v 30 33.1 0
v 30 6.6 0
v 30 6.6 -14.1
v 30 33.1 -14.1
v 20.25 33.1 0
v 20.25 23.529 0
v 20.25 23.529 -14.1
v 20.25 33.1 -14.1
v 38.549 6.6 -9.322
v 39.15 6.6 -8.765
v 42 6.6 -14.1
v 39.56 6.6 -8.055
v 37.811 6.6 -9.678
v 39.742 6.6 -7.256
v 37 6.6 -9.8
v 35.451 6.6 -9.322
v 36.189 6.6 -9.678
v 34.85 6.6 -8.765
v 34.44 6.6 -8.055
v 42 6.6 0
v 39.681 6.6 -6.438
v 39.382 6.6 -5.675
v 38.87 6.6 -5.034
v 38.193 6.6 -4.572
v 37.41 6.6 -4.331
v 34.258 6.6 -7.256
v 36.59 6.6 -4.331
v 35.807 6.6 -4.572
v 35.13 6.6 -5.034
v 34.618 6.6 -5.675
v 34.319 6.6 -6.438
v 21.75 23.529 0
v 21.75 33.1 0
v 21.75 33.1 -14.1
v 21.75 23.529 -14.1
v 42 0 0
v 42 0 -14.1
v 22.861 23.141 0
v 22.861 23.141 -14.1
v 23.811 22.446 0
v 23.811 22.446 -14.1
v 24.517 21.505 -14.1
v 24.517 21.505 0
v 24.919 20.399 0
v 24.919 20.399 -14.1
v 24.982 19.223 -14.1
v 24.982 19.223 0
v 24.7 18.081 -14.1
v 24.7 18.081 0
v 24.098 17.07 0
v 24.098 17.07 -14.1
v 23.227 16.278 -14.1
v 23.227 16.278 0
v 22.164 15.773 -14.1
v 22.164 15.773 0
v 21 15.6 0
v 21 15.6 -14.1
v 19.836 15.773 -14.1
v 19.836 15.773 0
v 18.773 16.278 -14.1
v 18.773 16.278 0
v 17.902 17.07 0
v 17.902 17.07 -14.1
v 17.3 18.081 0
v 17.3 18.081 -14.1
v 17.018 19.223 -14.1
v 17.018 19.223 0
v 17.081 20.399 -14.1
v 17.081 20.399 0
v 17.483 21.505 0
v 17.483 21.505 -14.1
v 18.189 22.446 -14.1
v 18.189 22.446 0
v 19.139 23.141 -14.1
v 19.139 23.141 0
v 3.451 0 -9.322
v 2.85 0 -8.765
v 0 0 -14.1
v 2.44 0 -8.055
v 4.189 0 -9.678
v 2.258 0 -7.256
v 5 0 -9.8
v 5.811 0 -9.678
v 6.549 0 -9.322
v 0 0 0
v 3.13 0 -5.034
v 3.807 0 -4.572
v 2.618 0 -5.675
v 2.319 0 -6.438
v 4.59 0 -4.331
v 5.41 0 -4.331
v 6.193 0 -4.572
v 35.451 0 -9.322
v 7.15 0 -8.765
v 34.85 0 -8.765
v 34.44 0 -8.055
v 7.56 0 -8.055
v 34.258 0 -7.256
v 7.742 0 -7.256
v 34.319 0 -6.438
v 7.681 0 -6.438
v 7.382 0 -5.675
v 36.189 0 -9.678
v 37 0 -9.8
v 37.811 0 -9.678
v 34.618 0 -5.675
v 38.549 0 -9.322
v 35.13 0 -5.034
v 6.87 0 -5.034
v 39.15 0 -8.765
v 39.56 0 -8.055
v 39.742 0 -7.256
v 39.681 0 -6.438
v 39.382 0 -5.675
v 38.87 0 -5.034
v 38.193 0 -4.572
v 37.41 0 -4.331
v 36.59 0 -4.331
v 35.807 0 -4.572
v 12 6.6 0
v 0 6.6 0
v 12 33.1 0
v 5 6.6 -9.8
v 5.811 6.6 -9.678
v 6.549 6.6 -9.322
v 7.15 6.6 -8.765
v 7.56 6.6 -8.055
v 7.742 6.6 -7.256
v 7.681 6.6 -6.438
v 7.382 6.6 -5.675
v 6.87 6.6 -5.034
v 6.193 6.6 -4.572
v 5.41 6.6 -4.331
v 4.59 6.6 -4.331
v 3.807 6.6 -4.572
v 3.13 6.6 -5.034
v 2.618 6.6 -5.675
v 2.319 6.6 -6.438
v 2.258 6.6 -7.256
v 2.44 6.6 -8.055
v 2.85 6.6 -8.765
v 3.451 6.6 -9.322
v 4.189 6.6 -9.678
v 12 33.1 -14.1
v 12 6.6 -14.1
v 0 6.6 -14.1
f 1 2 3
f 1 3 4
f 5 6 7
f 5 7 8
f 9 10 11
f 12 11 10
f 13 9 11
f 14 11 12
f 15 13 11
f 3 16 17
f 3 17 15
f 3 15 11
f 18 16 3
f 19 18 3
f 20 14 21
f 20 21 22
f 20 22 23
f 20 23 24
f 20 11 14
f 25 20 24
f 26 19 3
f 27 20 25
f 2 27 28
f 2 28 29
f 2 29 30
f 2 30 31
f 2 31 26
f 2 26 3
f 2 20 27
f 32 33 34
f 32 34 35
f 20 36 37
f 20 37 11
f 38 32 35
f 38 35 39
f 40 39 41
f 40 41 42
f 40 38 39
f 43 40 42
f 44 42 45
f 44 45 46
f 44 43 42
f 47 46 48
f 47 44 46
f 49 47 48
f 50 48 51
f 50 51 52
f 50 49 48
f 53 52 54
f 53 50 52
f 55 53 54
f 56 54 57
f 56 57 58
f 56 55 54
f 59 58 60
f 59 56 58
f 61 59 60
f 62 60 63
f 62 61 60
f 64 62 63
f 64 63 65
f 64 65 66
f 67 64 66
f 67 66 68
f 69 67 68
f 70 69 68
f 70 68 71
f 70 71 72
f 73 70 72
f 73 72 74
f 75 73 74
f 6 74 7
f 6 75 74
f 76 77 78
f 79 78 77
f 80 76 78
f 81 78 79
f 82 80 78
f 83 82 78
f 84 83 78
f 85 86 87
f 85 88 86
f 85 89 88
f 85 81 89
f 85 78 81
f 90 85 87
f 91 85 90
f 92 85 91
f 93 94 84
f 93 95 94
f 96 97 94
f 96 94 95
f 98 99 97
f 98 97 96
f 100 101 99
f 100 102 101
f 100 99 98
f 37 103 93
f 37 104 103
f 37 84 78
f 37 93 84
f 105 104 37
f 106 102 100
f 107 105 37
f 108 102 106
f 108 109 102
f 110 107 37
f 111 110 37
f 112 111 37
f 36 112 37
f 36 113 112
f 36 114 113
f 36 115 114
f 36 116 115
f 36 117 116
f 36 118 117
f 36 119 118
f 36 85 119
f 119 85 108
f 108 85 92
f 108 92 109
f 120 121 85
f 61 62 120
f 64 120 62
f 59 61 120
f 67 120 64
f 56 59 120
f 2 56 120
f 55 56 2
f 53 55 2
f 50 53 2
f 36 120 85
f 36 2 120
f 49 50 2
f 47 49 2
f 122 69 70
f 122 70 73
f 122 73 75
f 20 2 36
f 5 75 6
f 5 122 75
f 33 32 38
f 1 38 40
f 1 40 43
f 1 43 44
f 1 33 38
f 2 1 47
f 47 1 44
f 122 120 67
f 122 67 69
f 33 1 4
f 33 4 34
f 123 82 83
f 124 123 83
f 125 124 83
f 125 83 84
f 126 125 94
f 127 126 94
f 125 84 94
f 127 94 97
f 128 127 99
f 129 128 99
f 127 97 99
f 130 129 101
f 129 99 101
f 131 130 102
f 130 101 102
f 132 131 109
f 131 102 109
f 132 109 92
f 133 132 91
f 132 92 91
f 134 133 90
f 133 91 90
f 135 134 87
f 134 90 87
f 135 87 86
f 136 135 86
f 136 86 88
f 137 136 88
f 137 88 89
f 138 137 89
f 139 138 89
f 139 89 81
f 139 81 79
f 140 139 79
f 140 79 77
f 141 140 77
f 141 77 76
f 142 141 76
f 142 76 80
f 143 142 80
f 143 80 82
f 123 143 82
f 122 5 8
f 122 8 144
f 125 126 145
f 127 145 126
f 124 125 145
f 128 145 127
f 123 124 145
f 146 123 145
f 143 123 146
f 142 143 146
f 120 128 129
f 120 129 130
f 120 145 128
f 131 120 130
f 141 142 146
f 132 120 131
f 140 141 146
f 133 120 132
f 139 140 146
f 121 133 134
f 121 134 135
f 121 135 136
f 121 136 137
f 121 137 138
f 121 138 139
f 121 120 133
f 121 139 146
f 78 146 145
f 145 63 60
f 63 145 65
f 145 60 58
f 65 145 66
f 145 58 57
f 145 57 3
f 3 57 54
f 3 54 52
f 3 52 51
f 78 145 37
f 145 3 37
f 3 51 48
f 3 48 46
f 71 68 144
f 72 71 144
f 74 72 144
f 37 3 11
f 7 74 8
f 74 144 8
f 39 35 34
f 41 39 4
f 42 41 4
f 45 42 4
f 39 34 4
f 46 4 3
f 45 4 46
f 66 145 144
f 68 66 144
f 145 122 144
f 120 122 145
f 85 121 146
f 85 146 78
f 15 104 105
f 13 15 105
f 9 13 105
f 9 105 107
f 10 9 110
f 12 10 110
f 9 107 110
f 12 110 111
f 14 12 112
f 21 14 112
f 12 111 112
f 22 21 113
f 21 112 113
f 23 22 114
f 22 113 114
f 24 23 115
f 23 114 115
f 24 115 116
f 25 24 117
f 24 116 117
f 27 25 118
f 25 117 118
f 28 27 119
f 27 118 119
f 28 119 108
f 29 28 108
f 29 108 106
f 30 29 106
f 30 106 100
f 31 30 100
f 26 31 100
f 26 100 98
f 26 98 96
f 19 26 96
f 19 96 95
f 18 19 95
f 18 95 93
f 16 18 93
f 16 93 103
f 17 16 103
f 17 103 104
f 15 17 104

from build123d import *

# Parameters (mm, degrees)
BOSS_EXTRUDE1_DEPTH = 14.1
CUT_EXTRUDE1_DEPTH  = 14.1
SKETCH3_R           = 2.75
CUT_EXTRUDE2_DEPTH  = 56.302983645


with BuildPart() as part:
    # Sketch1 → Boss-Extrude1 (new body)
    with BuildSketch(Plane.XY):
        Polygon((0, 0), (42, 0), (42, 6.6), (30, 6.6), (30, 33.1), (12, 33.1), (12, 6.6), (0, 6.6), align=None)
    extrude(amount=-BOSS_EXTRUDE1_DEPTH)

    # Sketch2 → Cut-Extrude1 (cut)
    with BuildSketch(Plane.XY):
        with BuildLine():
            Line((20.25, 33.1), (21.75, 33.1))
            Line((21.75, 33.1), (21.75, 23.529058411))
            ThreePointArc((21.75, 23.529058411), (21, 15.6), (20.25, 23.529058411))
            Line((20.25, 23.529058411), (20.25, 33.1))
        make_face()
    extrude(amount=-CUT_EXTRUDE1_DEPTH, mode=Mode.SUBTRACT)

    # Sketch3 → Cut-Extrude2 (cut, through all)
    with BuildSketch(Plane.XZ):
        with Locations(Location((5, -7.05, 0), (0, 0, 270))):
            Circle(SKETCH3_R)
        with Locations(Location((37, -7.05, 0), (0, 0, 270))):
            Circle(SKETCH3_R)
    extrude(amount=-CUT_EXTRUDE2_DEPTH, mode=Mode.SUBTRACT)


solid = part.part
